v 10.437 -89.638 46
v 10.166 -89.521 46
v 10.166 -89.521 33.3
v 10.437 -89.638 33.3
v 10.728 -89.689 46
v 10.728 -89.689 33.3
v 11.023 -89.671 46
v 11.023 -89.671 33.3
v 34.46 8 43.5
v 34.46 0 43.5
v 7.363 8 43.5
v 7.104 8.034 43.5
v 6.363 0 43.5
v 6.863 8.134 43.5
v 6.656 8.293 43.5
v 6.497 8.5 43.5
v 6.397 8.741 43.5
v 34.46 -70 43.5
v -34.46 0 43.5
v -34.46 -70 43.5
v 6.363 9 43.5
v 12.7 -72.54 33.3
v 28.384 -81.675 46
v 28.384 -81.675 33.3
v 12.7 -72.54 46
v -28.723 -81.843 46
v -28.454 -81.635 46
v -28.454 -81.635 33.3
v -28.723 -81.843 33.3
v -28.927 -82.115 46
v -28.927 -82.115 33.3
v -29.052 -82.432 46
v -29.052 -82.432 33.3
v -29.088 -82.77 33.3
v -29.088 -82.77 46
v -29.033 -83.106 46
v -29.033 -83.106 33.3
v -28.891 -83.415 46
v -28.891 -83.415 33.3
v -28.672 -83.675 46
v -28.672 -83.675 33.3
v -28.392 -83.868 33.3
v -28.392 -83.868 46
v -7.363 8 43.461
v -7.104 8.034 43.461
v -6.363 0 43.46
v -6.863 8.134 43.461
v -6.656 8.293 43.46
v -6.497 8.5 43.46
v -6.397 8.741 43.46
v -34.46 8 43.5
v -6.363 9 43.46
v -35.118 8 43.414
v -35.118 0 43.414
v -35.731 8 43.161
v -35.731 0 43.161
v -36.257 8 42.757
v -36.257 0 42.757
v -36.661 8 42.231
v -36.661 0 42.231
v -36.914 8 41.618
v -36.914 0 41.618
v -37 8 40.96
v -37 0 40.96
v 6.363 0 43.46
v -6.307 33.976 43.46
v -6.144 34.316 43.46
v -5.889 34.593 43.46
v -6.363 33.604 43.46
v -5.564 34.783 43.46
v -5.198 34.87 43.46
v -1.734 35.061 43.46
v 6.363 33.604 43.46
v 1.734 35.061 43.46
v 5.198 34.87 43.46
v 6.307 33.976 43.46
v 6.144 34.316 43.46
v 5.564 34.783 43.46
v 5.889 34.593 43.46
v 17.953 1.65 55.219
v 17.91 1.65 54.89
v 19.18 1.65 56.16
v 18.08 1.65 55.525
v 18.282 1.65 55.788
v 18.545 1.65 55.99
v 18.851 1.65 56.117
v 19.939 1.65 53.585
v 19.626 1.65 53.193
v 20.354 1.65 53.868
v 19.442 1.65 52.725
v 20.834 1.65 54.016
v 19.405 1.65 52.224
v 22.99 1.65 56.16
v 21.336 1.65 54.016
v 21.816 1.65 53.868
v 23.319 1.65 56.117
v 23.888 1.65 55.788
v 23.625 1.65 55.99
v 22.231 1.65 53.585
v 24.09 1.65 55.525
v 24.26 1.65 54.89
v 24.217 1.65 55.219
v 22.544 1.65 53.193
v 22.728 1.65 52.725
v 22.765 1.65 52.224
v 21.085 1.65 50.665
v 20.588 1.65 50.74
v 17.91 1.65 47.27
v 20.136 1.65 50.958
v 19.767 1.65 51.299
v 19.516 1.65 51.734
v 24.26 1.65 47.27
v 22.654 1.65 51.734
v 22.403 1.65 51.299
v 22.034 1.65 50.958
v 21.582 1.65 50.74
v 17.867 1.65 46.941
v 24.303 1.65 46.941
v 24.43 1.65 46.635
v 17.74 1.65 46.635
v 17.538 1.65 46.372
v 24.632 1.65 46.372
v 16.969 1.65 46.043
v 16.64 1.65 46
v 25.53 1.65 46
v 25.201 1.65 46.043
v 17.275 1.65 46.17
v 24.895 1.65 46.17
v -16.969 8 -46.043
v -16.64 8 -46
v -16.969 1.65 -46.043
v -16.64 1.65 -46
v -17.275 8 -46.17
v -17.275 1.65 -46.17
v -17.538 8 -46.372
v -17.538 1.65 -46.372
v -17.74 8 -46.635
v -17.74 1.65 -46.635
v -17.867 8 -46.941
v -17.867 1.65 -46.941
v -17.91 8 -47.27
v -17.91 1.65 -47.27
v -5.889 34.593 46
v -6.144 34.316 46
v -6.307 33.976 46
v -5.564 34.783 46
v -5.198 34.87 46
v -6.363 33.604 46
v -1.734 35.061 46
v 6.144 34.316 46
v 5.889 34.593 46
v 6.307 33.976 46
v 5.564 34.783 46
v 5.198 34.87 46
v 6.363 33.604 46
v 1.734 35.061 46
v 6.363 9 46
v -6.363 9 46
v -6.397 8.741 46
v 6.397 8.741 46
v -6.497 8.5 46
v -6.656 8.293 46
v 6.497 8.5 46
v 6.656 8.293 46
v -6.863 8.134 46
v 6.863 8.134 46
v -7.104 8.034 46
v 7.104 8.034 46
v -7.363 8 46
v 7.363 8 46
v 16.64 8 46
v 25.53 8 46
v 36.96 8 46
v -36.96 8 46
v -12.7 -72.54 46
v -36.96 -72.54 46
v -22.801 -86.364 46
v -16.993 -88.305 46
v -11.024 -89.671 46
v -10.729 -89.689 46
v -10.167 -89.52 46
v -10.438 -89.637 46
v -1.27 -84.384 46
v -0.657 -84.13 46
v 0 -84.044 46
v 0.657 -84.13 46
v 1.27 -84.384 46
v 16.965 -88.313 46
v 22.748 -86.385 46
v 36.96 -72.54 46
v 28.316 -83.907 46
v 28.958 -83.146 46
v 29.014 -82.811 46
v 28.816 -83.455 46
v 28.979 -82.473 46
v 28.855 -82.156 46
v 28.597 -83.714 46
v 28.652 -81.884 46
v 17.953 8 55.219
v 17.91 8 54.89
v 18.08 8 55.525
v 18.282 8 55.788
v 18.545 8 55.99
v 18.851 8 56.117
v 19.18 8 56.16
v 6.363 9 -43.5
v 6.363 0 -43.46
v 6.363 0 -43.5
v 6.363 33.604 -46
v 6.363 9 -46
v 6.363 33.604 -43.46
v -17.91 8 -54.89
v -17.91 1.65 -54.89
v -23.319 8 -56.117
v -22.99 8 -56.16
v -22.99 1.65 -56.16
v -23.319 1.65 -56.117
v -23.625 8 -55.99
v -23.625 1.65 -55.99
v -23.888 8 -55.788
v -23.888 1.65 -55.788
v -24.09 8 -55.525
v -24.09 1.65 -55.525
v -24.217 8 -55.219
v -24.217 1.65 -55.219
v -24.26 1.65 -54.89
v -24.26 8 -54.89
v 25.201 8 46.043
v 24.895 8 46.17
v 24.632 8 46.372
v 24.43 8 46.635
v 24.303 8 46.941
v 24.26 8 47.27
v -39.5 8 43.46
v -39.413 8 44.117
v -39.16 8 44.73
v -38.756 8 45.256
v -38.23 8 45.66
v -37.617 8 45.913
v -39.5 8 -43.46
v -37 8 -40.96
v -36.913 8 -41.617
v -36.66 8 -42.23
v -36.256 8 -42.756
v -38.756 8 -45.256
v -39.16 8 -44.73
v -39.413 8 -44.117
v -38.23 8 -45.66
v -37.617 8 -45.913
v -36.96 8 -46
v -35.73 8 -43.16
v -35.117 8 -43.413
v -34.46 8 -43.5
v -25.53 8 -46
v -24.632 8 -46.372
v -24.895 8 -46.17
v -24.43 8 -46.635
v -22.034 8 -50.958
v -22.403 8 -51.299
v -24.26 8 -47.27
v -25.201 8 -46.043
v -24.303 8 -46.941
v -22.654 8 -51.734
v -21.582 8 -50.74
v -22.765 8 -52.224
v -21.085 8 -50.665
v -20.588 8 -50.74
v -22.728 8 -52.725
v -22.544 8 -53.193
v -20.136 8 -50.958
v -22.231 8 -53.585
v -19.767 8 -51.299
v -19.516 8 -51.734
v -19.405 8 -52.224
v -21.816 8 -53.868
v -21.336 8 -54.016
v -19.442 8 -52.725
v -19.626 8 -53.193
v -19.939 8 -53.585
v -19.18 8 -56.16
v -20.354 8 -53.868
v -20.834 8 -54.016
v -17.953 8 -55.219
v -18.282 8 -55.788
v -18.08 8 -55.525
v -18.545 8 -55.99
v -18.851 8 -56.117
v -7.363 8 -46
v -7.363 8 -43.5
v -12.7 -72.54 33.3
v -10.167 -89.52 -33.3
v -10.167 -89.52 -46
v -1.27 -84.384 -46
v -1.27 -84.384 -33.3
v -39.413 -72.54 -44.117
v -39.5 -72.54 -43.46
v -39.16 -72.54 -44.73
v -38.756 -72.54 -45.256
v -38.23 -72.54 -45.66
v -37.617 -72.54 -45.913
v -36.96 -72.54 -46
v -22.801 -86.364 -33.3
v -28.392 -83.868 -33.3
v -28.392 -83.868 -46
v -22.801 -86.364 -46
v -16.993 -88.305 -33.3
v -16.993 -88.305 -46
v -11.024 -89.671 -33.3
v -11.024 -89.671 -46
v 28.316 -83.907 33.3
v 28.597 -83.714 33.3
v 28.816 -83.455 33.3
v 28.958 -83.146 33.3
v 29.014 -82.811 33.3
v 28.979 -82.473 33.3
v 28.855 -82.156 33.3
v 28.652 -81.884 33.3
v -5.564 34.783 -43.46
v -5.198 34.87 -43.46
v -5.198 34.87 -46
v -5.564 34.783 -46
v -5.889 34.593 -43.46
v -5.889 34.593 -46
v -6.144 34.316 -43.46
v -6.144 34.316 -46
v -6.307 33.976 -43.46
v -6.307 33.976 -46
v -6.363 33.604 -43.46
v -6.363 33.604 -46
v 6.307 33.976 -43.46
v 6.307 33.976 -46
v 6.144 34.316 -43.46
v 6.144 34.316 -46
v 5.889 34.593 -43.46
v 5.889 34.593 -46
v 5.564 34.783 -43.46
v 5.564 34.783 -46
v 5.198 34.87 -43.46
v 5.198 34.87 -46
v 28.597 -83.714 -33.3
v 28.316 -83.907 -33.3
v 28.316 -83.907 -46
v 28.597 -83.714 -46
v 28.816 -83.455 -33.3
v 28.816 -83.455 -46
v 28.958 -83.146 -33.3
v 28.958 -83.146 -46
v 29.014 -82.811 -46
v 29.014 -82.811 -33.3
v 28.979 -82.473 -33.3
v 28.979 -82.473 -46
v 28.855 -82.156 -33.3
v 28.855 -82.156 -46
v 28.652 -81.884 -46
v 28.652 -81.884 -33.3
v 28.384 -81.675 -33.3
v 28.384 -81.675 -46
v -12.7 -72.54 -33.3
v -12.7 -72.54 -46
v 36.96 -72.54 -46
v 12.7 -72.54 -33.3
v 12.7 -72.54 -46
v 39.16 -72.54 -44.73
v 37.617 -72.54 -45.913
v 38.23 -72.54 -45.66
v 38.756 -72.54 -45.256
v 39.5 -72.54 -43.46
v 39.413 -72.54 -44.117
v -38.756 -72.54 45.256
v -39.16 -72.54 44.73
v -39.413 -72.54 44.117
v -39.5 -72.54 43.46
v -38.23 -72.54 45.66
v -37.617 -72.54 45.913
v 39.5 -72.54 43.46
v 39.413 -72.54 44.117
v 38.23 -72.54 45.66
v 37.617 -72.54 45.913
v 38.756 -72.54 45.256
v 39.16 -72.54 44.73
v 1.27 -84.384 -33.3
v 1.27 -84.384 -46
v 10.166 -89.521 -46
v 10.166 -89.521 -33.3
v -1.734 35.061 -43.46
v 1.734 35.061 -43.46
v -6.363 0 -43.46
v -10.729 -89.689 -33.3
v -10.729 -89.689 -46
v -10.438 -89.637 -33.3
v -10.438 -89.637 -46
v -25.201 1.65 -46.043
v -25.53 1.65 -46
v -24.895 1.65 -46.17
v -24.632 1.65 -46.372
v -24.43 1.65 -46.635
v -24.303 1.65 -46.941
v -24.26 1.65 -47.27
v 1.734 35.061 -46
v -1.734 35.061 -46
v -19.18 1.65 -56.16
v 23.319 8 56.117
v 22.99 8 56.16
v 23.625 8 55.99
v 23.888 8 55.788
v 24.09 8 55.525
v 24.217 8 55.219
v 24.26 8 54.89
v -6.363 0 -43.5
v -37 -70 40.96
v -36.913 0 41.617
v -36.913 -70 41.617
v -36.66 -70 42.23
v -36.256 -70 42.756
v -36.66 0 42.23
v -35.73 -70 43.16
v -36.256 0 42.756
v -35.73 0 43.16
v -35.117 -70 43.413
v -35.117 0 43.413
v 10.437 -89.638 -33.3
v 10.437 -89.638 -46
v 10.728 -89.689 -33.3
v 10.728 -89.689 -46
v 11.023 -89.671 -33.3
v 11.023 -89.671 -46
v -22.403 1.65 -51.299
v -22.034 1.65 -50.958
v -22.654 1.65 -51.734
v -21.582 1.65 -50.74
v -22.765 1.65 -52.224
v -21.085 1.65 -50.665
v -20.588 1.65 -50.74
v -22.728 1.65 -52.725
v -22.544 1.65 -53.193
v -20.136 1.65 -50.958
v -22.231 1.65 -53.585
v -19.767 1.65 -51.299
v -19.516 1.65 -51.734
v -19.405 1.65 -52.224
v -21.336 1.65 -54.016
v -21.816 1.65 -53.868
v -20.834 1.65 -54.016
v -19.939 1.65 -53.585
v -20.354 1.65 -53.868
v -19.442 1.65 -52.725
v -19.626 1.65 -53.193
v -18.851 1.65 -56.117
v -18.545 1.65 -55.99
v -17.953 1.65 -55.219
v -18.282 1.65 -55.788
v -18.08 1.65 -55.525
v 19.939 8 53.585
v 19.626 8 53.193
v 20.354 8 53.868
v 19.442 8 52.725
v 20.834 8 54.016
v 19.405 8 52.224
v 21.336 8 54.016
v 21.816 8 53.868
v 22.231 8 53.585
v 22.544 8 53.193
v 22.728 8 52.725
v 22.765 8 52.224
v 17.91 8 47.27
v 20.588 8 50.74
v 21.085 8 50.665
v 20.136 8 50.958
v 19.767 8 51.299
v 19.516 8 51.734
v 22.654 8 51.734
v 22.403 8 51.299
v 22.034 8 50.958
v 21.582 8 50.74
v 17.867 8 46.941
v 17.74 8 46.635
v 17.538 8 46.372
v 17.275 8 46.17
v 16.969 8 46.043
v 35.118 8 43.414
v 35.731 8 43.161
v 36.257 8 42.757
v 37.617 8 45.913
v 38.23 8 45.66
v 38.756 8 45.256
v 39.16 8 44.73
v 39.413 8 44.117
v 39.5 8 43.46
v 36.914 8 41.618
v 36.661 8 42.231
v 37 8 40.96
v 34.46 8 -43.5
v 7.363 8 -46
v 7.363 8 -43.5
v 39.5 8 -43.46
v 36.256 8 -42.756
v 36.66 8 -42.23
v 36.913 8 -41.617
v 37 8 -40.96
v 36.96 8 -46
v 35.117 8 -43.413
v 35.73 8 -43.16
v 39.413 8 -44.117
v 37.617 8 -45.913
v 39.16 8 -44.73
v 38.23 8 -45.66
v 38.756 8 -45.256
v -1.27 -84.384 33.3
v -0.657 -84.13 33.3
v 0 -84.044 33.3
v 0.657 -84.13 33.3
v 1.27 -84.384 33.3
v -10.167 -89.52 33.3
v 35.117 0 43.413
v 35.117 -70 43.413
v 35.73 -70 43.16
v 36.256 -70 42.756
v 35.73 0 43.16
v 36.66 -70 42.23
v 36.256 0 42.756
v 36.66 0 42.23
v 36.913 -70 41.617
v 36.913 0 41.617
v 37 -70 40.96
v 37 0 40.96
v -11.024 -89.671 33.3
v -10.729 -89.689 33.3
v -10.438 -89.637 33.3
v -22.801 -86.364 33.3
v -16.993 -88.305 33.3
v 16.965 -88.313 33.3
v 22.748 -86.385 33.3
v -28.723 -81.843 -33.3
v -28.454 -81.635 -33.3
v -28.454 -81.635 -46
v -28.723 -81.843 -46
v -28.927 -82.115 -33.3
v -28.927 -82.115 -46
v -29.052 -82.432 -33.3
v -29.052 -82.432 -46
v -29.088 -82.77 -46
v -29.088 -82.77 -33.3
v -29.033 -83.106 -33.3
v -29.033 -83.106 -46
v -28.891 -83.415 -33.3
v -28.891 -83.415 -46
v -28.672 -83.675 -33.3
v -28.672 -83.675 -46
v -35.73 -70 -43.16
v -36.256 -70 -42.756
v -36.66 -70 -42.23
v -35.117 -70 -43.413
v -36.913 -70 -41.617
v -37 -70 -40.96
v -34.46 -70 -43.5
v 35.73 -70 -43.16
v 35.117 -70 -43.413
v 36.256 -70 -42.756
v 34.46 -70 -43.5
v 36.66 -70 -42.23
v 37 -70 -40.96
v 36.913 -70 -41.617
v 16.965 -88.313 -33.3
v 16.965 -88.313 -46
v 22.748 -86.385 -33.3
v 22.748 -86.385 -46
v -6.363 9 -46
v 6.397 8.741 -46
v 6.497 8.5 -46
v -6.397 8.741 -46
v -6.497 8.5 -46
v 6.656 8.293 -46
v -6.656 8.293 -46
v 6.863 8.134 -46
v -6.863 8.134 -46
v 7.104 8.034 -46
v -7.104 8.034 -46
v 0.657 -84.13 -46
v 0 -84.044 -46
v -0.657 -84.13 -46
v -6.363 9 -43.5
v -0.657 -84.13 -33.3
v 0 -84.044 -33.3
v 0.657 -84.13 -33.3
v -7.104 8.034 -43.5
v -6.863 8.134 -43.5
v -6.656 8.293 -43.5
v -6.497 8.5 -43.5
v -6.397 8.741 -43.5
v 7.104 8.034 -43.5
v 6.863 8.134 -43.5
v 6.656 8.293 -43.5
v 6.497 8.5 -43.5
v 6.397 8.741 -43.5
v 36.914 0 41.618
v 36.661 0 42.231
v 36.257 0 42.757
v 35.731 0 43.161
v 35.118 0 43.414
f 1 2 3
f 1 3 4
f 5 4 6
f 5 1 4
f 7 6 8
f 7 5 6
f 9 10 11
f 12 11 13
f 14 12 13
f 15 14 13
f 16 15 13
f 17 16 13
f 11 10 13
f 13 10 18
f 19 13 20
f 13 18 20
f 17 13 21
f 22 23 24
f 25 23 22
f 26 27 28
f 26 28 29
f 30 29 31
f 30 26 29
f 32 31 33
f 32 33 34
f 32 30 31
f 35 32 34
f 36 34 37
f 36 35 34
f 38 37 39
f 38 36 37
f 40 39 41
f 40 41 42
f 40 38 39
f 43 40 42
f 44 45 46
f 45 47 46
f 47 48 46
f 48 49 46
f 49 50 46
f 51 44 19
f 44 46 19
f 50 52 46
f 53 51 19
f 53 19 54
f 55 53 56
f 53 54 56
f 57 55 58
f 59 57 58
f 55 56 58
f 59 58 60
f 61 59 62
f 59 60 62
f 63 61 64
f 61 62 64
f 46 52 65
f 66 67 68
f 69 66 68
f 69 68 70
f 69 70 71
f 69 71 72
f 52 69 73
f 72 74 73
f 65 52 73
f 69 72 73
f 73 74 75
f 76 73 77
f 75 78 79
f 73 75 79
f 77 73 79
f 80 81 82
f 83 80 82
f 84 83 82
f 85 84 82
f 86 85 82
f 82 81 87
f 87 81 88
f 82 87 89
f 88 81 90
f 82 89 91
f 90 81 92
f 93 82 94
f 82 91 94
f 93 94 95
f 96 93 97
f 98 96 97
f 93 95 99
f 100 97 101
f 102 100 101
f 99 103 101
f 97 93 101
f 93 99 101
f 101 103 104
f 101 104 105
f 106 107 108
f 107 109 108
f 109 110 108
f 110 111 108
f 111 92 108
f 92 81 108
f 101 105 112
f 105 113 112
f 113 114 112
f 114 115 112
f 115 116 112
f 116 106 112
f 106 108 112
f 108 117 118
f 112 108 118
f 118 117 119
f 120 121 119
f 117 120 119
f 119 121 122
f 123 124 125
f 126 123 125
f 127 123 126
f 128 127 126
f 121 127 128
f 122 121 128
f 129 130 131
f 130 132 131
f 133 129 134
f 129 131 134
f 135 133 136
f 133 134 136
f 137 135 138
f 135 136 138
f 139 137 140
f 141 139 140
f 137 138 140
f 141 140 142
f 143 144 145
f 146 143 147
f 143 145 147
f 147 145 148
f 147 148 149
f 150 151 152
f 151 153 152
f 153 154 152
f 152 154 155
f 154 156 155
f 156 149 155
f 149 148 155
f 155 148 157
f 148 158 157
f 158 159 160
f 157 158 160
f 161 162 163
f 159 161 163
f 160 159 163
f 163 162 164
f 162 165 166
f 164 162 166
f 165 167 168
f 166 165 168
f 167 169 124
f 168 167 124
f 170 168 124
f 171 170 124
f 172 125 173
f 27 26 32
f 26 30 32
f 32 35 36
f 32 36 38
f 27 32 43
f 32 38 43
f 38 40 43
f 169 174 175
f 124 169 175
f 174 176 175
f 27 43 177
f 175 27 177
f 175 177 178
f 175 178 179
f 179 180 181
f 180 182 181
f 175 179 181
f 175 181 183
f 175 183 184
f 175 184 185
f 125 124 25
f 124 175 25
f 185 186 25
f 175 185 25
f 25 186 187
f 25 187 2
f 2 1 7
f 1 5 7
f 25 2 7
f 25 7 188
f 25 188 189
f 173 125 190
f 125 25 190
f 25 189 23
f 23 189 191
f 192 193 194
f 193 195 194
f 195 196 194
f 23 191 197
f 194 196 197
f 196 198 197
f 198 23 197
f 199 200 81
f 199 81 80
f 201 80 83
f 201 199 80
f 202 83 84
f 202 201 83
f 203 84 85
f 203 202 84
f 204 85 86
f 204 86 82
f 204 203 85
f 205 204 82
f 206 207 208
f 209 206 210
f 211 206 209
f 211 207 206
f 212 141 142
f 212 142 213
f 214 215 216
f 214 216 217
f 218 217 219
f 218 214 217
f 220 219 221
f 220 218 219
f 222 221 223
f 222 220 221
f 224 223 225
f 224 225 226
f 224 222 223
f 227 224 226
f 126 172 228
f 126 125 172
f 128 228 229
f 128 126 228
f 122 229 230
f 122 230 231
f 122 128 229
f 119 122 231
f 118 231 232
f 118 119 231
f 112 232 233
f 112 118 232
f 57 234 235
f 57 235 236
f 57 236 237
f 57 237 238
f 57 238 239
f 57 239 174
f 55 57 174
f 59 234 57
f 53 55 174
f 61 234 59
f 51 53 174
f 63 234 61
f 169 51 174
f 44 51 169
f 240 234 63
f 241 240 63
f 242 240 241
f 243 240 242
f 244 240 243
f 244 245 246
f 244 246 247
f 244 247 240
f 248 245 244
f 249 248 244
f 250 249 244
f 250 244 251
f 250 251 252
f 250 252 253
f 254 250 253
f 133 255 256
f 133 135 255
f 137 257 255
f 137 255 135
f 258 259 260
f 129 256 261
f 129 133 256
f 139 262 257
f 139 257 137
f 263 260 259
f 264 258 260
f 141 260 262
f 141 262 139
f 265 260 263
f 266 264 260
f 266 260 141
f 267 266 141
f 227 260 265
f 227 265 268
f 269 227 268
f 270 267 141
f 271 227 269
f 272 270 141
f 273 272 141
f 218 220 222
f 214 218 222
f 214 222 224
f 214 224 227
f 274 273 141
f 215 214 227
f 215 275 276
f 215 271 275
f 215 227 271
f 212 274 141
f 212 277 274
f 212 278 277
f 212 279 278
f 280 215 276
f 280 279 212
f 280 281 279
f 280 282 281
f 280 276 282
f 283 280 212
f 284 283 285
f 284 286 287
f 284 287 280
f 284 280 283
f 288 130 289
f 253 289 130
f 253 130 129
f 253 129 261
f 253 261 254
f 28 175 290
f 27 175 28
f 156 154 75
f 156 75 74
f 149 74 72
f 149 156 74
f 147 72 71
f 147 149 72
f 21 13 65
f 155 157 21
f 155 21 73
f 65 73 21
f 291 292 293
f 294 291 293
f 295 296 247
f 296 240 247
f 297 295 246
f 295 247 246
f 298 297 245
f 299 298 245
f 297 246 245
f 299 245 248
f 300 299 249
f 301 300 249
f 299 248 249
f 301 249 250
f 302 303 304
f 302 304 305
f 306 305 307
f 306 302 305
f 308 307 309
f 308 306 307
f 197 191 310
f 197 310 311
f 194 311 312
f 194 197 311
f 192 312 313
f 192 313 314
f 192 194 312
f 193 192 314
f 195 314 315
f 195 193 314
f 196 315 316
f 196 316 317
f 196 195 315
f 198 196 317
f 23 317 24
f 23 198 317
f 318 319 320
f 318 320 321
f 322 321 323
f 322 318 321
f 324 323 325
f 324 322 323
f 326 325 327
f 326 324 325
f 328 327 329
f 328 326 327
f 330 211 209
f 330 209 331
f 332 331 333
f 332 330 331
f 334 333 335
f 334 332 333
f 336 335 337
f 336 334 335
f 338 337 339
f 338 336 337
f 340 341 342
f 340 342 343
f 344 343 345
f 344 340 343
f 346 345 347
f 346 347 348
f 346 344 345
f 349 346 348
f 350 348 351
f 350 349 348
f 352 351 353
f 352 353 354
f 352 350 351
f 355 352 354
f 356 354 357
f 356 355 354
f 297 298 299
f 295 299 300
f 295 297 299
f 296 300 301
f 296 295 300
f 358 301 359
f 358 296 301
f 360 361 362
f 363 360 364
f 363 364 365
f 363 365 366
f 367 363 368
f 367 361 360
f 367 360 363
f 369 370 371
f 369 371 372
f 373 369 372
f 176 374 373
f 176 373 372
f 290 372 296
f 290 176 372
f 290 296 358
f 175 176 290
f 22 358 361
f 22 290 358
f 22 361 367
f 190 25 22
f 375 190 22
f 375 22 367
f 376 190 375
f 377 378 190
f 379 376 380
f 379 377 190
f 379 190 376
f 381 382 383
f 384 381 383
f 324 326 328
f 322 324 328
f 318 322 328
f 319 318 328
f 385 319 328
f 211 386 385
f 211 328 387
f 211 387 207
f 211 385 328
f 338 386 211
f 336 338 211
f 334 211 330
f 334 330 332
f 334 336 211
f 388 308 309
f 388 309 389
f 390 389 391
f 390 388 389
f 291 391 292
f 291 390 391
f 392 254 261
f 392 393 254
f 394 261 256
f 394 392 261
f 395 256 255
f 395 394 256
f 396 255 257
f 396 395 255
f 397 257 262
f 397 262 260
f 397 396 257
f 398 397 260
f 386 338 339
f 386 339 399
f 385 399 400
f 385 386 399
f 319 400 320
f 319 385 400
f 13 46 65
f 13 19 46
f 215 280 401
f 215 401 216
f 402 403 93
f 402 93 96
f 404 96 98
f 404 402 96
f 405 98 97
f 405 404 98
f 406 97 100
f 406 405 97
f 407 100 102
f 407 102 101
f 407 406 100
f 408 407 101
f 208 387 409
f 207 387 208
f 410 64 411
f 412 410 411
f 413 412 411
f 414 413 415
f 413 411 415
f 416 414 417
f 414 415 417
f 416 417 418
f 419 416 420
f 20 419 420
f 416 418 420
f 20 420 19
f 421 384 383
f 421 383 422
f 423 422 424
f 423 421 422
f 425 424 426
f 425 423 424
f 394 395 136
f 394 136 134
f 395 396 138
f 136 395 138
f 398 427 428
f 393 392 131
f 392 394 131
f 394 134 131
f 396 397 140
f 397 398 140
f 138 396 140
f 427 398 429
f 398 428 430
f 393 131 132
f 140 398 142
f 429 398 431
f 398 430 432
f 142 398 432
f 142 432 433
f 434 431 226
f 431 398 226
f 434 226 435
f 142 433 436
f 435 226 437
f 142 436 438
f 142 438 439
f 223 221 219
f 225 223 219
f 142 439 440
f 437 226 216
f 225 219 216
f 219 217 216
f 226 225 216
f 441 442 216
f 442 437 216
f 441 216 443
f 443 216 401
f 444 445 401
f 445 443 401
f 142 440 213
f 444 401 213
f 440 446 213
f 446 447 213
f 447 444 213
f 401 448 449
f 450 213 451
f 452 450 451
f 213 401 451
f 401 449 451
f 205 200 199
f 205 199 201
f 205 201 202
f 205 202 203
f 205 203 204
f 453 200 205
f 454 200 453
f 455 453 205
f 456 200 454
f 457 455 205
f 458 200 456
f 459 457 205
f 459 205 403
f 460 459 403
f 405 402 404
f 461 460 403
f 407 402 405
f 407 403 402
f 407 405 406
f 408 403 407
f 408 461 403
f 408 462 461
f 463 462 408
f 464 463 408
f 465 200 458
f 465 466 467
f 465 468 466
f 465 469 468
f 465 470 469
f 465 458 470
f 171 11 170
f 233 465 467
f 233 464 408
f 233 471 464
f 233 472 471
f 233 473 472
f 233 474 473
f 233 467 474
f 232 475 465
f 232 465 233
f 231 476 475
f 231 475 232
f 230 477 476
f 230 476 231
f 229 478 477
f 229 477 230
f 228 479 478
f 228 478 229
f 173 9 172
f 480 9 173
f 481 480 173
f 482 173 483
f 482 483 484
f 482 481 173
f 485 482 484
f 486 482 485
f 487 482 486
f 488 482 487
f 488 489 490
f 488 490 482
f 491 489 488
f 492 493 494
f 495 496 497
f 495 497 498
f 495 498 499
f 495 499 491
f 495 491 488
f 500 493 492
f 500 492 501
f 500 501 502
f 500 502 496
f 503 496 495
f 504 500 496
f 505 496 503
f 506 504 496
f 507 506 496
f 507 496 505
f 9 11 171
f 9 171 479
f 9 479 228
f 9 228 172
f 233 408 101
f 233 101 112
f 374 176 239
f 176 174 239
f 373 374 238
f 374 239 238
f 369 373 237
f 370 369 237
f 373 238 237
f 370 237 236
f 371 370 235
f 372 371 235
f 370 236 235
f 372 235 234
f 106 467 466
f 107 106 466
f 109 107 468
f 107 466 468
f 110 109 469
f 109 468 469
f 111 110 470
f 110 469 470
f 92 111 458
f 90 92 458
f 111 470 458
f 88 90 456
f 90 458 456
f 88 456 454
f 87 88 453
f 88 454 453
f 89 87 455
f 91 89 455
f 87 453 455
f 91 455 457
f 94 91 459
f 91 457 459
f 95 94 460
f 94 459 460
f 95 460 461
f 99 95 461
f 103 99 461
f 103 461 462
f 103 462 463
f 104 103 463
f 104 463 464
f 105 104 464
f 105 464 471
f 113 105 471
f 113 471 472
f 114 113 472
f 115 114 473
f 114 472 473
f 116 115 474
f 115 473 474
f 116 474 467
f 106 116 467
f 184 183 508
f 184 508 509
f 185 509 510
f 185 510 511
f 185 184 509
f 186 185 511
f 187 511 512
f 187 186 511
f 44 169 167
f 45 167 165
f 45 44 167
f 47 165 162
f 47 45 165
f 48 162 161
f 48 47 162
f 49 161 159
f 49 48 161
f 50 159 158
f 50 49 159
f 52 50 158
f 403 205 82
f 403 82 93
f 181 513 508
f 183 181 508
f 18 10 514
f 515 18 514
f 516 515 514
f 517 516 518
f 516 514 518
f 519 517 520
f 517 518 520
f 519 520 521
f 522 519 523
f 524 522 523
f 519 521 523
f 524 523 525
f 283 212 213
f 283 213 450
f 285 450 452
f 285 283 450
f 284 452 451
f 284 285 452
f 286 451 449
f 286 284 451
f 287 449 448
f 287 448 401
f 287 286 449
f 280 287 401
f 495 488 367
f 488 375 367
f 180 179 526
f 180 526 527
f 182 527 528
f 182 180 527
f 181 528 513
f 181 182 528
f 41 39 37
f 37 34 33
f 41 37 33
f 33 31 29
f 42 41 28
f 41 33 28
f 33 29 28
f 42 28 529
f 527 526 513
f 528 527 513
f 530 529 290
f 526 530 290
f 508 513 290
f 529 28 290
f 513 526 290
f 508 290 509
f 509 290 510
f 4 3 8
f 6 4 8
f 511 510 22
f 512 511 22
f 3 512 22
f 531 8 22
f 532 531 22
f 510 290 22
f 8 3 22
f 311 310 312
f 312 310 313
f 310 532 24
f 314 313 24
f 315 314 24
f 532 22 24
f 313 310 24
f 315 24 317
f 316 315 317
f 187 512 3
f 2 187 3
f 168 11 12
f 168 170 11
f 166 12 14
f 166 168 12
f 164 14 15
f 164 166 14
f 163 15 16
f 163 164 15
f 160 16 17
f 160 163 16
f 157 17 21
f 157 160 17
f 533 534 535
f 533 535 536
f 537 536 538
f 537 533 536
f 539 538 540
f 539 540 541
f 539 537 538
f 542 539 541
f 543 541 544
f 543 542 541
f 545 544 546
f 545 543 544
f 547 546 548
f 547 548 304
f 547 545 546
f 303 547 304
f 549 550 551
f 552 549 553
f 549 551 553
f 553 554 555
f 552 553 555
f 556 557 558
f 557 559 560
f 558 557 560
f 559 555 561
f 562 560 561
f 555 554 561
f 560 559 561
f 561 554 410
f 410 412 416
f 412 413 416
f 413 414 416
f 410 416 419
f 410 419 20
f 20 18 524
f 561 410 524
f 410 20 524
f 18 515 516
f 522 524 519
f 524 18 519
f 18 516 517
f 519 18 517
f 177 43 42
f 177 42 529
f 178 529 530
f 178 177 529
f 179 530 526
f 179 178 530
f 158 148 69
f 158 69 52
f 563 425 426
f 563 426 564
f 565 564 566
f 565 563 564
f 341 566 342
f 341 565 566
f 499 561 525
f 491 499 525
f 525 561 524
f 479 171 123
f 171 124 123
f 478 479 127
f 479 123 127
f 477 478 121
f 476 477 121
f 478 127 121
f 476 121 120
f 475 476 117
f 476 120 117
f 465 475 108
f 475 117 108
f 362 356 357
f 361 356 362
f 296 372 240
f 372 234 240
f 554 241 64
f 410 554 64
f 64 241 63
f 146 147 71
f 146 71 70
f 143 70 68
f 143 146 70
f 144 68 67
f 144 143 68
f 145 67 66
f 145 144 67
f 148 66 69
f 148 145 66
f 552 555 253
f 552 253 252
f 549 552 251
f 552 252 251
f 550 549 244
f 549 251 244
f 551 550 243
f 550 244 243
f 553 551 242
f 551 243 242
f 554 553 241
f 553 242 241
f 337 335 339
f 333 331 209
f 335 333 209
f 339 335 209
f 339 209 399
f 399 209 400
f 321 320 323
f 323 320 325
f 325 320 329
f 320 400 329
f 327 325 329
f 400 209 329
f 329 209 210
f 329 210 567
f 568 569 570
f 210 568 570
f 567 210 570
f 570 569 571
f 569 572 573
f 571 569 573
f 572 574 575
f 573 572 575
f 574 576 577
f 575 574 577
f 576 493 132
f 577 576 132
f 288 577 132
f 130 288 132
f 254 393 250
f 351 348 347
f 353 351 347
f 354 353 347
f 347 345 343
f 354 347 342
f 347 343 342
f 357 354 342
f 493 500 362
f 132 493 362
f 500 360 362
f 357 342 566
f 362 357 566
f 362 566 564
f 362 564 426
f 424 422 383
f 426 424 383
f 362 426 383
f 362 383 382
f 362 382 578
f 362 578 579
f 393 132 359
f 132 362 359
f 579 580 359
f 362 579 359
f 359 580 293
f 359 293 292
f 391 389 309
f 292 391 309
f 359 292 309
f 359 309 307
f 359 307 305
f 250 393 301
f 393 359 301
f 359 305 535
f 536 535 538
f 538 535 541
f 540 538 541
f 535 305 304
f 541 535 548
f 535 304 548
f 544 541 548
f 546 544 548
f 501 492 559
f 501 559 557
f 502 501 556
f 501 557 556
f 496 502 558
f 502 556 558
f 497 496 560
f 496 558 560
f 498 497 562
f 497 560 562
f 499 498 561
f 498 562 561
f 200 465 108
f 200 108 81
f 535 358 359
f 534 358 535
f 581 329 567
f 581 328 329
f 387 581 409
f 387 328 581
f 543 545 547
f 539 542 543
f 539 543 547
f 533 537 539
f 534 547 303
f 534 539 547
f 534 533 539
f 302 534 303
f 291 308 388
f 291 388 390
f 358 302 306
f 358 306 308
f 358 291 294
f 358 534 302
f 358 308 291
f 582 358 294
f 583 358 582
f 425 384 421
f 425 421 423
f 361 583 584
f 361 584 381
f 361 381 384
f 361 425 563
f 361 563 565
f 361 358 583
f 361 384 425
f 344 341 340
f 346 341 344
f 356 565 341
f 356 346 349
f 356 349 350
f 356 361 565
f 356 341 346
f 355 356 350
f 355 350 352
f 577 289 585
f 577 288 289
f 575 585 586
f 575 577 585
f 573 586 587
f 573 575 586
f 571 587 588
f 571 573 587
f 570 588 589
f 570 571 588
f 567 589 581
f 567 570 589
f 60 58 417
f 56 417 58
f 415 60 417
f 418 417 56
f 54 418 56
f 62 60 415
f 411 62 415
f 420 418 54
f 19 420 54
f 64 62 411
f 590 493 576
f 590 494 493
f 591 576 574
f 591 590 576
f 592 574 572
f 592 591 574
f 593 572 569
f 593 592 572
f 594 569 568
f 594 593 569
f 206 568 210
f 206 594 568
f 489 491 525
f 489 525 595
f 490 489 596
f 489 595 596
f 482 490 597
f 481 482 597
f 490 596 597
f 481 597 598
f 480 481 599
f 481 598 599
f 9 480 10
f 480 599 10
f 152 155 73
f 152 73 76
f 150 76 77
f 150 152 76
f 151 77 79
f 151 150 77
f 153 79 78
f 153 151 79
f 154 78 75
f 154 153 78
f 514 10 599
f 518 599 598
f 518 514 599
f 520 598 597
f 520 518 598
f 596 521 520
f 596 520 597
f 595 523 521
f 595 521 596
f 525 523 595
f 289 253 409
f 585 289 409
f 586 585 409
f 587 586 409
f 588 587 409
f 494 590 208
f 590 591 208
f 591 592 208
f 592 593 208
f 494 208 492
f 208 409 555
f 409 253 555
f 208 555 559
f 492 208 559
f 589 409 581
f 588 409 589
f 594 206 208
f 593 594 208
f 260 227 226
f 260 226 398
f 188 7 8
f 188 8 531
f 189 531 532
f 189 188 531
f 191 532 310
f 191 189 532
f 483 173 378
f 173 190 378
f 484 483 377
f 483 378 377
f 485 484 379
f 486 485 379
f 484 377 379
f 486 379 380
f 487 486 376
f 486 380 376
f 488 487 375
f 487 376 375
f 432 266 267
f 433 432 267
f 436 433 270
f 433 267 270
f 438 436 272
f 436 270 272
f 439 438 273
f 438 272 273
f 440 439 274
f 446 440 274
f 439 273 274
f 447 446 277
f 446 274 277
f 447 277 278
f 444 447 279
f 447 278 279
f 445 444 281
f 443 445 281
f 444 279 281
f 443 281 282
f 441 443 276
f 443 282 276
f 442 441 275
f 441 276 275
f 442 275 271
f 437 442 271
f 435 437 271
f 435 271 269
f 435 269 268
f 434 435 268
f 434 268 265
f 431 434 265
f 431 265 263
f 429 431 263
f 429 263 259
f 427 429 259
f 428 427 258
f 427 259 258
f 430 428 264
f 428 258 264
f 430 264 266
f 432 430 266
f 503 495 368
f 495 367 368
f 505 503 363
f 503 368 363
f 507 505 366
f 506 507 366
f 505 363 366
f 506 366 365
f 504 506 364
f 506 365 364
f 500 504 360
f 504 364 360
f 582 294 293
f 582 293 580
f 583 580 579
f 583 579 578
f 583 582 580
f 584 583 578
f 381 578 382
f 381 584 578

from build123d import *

# Parameters (mm, degrees)
BOSS_EXTRUDE1_DEPTH = 70
CUT_EXTRUDE1_DEPTH  = 79.756
BOSS_EXTRUDE3_DEPTH = 2.54
BOSS_EXTRUDE4_DEPTH = 2.54
BOSS_EXTRUDE5_DEPTH = 12.7
BOSS_EXTRUDE6_START = -2.54
BOSS_EXTRUDE6_DEPTH = 2.54
BOSS_EXTRUDE7_START = -12.7
BOSS_EXTRUDE7_DEPTH = 12.7
BOSS_EXTRUDE8_START = 8
BOSS_EXTRUDE8_DEPTH = 8
SKETCH9_R           = 1.685173155
BOSS_EXTRUDE9_DEPTH = 6.35
FILLET1_R           = 1.27
FILLET3_R           = 1


with BuildPart() as part:
    # Sketch1 → Boss-Extrude1 (new body)
    with BuildSketch(Plane(origin=(0, 0, 0), x_dir=(1, 0, 0), z_dir=(0, 1, 0))):
        with BuildLine():
            Line((-36.96, -46), (36.96, -46))
            ThreePointArc((36.96, -46), (38.756051224, -45.256051224), (39.5, -43.46))
            Line((39.5, -43.46), (39.5, 43.46))
            ThreePointArc((39.5, 43.46), (38.756051224, 45.256051224), (36.96, 46))
            Line((36.96, 46), (-36.96, 46))
            ThreePointArc((-36.96, 46), (-38.756051224, 45.256051224), (-39.5, 43.46))
            Line((-39.5, 43.46), (-39.5, -43.46))
            ThreePointArc((-39.5, -43.46), (-38.756051224, -45.256051224), (-36.96, -46))
        make_face()
    extrude(amount=-BOSS_EXTRUDE1_DEPTH)

    # Sketch2 → Cut-Extrude1 (cut)
    with BuildSketch(Plane(origin=(0, 0, 0), x_dir=(1, 0, 0), z_dir=(0, 1, 0))):
        with BuildLine():
            Line((-34.46, -43.5), (34.46, -43.5))
            ThreePointArc((34.46, -43.5), (36.256051224, -42.756051224), (37, -40.96))
            Line((37, -40.96), (37, 40.96))
            ThreePointArc((37, 40.96), (36.256051224, 42.756051224), (34.46, 43.5))
            Line((34.46, 43.5), (-34.46, 43.5))
            ThreePointArc((-34.46, 43.5), (-36.256051224, 42.756051224), (-37, 40.96))
            Line((-37, 40.96), (-37, -40.96))
            ThreePointArc((-37, -40.96), (-36.256051224, -42.756051224), (-34.46, -43.5))
        make_face()
    extrude(amount=-CUT_EXTRUDE1_DEPTH, mode=Mode.SUBTRACT)

    # Sketch4 → Boss-Extrude3 (add)
    with BuildSketch(Plane.XZ.offset(70)):
        with BuildLine():
            Line((36.96, 46), (-36.96, 46))
            ThreePointArc((-36.96, 46), (-38.756051224, 45.256051224), (-39.5, 43.46))
            Line((-39.5, 43.46), (-39.5, -43.46))
            ThreePointArc((-39.5, -43.46), (-38.756051224, -45.256051224), (-36.96, -46))
            Line((-36.96, -46), (36.96, -46))
            ThreePointArc((36.96, -46), (38.756051224, -45.256051224), (39.5, -43.46))
            Line((39.5, -43.46), (39.5, 43.46))
            ThreePointArc((39.5, 43.46), (38.756051224, 45.256051224), (36.96, 46))
        make_face()
    extrude(amount=BOSS_EXTRUDE3_DEPTH)

    # Sketch5 → Boss-Extrude4 (add)
    with BuildSketch(Plane.XY.offset(46)):
        with BuildLine():
            Line((6.362854251, 0), (6.362854251, 33.604002981))
            ThreePointArc((6.362854251, 33.604002981), (6.027268312, 34.464102023), (5.197861555, 34.869654381))
            ThreePointArc((5.197861555, 34.869654381), (0, 35.084910085), (-5.197861555, 34.869654381))
            ThreePointArc((-5.197861555, 34.869654381), (-6.027268312, 34.464102023), (-6.362854251, 33.604002981))
            Line((-6.362854251, 33.604002981), (-6.362854251, 0))
            Line((-6.362854251, 0), (6.362854251, 0))
        make_face()
    extrude(amount=-BOSS_EXTRUDE4_DEPTH)

    # Sketch5<4> → Boss-Extrude5 (add)
    with BuildSketch(Plane.XY.offset(46)):
        with BuildLine():
            Line((-12.7, -72.54), (-28.453647637, -81.635372704))
            ThreePointArc((-28.453647637, -81.635372704), (-29.088167479, -82.770144478), (-28.392228001, -83.868320535))
            ThreePointArc((-28.392228001, -83.868320535), (-19.920711126, -87.405365539), (-11.024381507, -89.670890825))
            ThreePointArc((-11.024381507, -89.670890825), (-10.582224591, -89.671469352), (-10.166666729, -89.520423878))
            Line((-10.166666729, -89.520423878), (-1.270072648, -84.383972891))
            ThreePointArc((-1.270072648, -84.383972891), (-9.734e-06, -84.043677417), (1.270036321, -84.384035808))
            Line((1.270036321, -84.384035808), (10.165723413, -89.520550737))
            ThreePointArc((10.165723413, -89.520550737), (10.581295609, -89.671620625), (11.023474349, -89.671052407))
            ThreePointArc((11.023474349, -89.671052407), (19.880019162, -87.418945228), (28.31647684, -83.906602049))
            ThreePointArc((28.31647684, -83.906602049), (29.01385185, -82.810943696), (28.383639864, -81.675324049))
            Line((28.383639864, -81.675324049), (12.7, -72.54))
            Line((12.7, -72.54), (-12.7, -72.54))
        make_face()
    extrude(amount=-BOSS_EXTRUDE5_DEPTH)

    # Sketch6 → Boss-Extrude6 (add)
    with BuildSketch(Plane(origin=(0, 0, -46), x_dir=(-1, 0, 0), z_dir=(0, 0, -1)).offset(BOSS_EXTRUDE6_START)):
        with BuildLine():
            Line((-6.362854251, 0), (-6.362854251, 33.604002981))
            ThreePointArc((-6.362854251, 33.604002981), (-6.027268312, 34.464102023), (-5.197861555, 34.869654381))
            ThreePointArc((-5.197861555, 34.869654381), (0, 35.084910085), (5.197861555, 34.869654381))
            ThreePointArc((5.197861555, 34.869654381), (6.027268312, 34.464102023), (6.362854251, 33.604002981))
            Line((6.362854251, 33.604002981), (6.362854251, 0))
            Line((6.362854251, 0), (-6.362854251, 0))
        make_face()
    extrude(amount=BOSS_EXTRUDE6_DEPTH)

    # Sketch6<3> → Boss-Extrude7 (add)
    with BuildSketch(Plane(origin=(0, 0, -46), x_dir=(-1, 0, 0), z_dir=(0, 0, -1)).offset(BOSS_EXTRUDE7_START)):
        with BuildLine():
            Line((-12.7, -72.54), (12.7, -72.54))
            Line((12.7, -72.54), (28.453647637, -81.635372704))
            ThreePointArc((28.453647637, -81.635372704), (29.088167479, -82.770144478), (28.392228001, -83.868320535))
            ThreePointArc((28.392228001, -83.868320535), (19.920711126, -87.405365539), (11.024381507, -89.670890825))
            ThreePointArc((11.024381507, -89.670890825), (10.582224591, -89.671469352), (10.166666729, -89.520423878))
            Line((10.166666729, -89.520423878), (1.270072648, -84.383972891))
            ThreePointArc((1.270072648, -84.383972891), (9.734e-06, -84.043677417), (-1.270036321, -84.384035808))
            Line((-1.270036321, -84.384035808), (-10.165723413, -89.520550737))
            ThreePointArc((-10.165723413, -89.520550737), (-10.581295609, -89.671620625), (-11.023474349, -89.671052407))
            ThreePointArc((-11.023474349, -89.671052407), (-19.880019162, -87.418945228), (-28.31647684, -83.906602049))
            ThreePointArc((-28.31647684, -83.906602049), (-29.01385185, -82.810943696), (-28.383639864, -81.675324049))
            Line((-28.383639864, -81.675324049), (-12.7, -72.54))
        make_face()
    extrude(amount=BOSS_EXTRUDE7_DEPTH)

    # Sketch8 → Boss-Extrude8 (add)
    with BuildSketch(Plane(origin=(0, 0, 0), x_dir=(1, 0, 0), z_dir=(0, 1, 0)).offset(BOSS_EXTRUDE8_START)):
        with BuildLine():
            Line((6.362854251, -43.5), (6.362854251, -46))
            Line((6.362854251, -46), (36.96, -46))
            ThreePointArc((36.96, -46), (38.756051224, -45.256051224), (39.5, -43.46))
            Line((39.5, -43.46), (39.5, 43.46))
            ThreePointArc((39.5, 43.46), (38.756051224, 45.256051224), (36.96, 46))
            Line((36.96, 46), (6.362854251, 46))
            Line((6.362854251, 46), (6.362854251, 43.5))
            Line((6.362854251, 43.5), (34.46, 43.5))
            ThreePointArc((34.46, 43.5), (36.256051224, 42.756051224), (37, 40.96))
            Line((37, 40.96), (37, -40.96))
            ThreePointArc((37, -40.96), (36.257110645, -42.757110645), (34.46, -43.5))
            Line((34.46, -43.5), (6.362854251, -43.5))
        make_face()
        with BuildLine():
            Line((-37, -40.96), (-37, 40.96))
            ThreePointArc((-37, 40.96), (-36.256051224, 42.756051224), (-34.46, 43.5))
            Line((-34.46, 43.5), (-6.362854251, 43.5))
            Line((-6.362854251, 43.5), (-6.362854251, 46))
            Line((-6.362854251, 46), (-36.96, 46))
            ThreePointArc((-36.96, 46), (-38.756051224, 45.256051224), (-39.5, 43.46))
            Line((-39.5, 43.46), (-39.5, -43.46))
            ThreePointArc((-39.5, -43.46), (-38.756051224, -45.256051224), (-36.96, -46))
            Line((-36.96, -46), (-6.362854251, -46))
            Line((-6.362854251, -46), (-6.362854251, -43.46))
            Line((-6.362854251, -43.46), (-34.46, -43.5))
            ThreePointArc((-34.46, -43.5), (-36.257110645, -42.757110645), (-37, -40.96))
        make_face()
    extrude(amount=-BOSS_EXTRUDE8_DEPTH)

    # Sketch9 → Boss-Extrude9 (add)
    # profile 1 of 2: a face of its own
    with BuildSketch(Plane(origin=(0, 8, 0), x_dir=(1, 0, 0), z_dir=(0, 1, 0))):
        with BuildLine():
            Line((-24.26, 46), (-17.91, 46))
            Line((-17.91, 46), (-17.91, 54.89))
            ThreePointArc((-17.91, 54.89), (-18.281974388, 55.788025612), (-19.18, 56.16))
            Line((-19.18, 56.16), (-22.99, 56.16))
            ThreePointArc((-22.99, 56.16), (-23.888025612, 55.788025612), (-24.26, 54.89))
            Line((-24.26, 54.89), (-24.26, 46))
        make_face()
        with Locations((-21.085, 52.35)):
            Circle(SKETCH9_R, mode=Mode.SUBTRACT)
    # profile 2 of 2: a face of its own
    with BuildSketch(Plane(origin=(0, 8, 0), x_dir=(1, 0, 0), z_dir=(0, 1, 0))):
        with BuildLine():
            Line((24.26, -46), (17.91, -46))
            Line((17.91, -46), (17.91, -54.89))
            ThreePointArc((17.91, -54.89), (18.281974388, -55.788025612), (19.18, -56.16))
            Line((19.18, -56.16), (22.99, -56.16))
            ThreePointArc((22.99, -56.16), (23.888025612, -55.788025612), (24.26, -54.89))
            Line((24.26, -54.89), (24.26, -46))
        make_face()
        with Locations((21.085, -52.35)):
            Circle(SKETCH9_R, mode=Mode.SUBTRACT)
    extrude(amount=-BOSS_EXTRUDE9_DEPTH)

    # Fillet1
    fillet1_edges = [part.edges().sort_by_distance(p)[0] for p in [
        (-24.26, 4.825, -46),
        (-17.91, 4.825, -46),
        (17.91, 4.825, 46),
        (24.26, 4.825, 46),
    ]]
    fillet(fillet1_edges, radius=FILLET1_R)

    # Fillet3
    fillet3_edges = [part.edges().sort_by_distance(p)[0] for p in [
        (-6.362854251, 8, 44.73),
        (6.362854251, 8, 44.75),
        (6.362854251, 8, -44.75),
        (-6.362854251, 8, -44.75),
    ]]
    fillet(fillet3_edges, radius=FILLET3_R)


solid = part.part
